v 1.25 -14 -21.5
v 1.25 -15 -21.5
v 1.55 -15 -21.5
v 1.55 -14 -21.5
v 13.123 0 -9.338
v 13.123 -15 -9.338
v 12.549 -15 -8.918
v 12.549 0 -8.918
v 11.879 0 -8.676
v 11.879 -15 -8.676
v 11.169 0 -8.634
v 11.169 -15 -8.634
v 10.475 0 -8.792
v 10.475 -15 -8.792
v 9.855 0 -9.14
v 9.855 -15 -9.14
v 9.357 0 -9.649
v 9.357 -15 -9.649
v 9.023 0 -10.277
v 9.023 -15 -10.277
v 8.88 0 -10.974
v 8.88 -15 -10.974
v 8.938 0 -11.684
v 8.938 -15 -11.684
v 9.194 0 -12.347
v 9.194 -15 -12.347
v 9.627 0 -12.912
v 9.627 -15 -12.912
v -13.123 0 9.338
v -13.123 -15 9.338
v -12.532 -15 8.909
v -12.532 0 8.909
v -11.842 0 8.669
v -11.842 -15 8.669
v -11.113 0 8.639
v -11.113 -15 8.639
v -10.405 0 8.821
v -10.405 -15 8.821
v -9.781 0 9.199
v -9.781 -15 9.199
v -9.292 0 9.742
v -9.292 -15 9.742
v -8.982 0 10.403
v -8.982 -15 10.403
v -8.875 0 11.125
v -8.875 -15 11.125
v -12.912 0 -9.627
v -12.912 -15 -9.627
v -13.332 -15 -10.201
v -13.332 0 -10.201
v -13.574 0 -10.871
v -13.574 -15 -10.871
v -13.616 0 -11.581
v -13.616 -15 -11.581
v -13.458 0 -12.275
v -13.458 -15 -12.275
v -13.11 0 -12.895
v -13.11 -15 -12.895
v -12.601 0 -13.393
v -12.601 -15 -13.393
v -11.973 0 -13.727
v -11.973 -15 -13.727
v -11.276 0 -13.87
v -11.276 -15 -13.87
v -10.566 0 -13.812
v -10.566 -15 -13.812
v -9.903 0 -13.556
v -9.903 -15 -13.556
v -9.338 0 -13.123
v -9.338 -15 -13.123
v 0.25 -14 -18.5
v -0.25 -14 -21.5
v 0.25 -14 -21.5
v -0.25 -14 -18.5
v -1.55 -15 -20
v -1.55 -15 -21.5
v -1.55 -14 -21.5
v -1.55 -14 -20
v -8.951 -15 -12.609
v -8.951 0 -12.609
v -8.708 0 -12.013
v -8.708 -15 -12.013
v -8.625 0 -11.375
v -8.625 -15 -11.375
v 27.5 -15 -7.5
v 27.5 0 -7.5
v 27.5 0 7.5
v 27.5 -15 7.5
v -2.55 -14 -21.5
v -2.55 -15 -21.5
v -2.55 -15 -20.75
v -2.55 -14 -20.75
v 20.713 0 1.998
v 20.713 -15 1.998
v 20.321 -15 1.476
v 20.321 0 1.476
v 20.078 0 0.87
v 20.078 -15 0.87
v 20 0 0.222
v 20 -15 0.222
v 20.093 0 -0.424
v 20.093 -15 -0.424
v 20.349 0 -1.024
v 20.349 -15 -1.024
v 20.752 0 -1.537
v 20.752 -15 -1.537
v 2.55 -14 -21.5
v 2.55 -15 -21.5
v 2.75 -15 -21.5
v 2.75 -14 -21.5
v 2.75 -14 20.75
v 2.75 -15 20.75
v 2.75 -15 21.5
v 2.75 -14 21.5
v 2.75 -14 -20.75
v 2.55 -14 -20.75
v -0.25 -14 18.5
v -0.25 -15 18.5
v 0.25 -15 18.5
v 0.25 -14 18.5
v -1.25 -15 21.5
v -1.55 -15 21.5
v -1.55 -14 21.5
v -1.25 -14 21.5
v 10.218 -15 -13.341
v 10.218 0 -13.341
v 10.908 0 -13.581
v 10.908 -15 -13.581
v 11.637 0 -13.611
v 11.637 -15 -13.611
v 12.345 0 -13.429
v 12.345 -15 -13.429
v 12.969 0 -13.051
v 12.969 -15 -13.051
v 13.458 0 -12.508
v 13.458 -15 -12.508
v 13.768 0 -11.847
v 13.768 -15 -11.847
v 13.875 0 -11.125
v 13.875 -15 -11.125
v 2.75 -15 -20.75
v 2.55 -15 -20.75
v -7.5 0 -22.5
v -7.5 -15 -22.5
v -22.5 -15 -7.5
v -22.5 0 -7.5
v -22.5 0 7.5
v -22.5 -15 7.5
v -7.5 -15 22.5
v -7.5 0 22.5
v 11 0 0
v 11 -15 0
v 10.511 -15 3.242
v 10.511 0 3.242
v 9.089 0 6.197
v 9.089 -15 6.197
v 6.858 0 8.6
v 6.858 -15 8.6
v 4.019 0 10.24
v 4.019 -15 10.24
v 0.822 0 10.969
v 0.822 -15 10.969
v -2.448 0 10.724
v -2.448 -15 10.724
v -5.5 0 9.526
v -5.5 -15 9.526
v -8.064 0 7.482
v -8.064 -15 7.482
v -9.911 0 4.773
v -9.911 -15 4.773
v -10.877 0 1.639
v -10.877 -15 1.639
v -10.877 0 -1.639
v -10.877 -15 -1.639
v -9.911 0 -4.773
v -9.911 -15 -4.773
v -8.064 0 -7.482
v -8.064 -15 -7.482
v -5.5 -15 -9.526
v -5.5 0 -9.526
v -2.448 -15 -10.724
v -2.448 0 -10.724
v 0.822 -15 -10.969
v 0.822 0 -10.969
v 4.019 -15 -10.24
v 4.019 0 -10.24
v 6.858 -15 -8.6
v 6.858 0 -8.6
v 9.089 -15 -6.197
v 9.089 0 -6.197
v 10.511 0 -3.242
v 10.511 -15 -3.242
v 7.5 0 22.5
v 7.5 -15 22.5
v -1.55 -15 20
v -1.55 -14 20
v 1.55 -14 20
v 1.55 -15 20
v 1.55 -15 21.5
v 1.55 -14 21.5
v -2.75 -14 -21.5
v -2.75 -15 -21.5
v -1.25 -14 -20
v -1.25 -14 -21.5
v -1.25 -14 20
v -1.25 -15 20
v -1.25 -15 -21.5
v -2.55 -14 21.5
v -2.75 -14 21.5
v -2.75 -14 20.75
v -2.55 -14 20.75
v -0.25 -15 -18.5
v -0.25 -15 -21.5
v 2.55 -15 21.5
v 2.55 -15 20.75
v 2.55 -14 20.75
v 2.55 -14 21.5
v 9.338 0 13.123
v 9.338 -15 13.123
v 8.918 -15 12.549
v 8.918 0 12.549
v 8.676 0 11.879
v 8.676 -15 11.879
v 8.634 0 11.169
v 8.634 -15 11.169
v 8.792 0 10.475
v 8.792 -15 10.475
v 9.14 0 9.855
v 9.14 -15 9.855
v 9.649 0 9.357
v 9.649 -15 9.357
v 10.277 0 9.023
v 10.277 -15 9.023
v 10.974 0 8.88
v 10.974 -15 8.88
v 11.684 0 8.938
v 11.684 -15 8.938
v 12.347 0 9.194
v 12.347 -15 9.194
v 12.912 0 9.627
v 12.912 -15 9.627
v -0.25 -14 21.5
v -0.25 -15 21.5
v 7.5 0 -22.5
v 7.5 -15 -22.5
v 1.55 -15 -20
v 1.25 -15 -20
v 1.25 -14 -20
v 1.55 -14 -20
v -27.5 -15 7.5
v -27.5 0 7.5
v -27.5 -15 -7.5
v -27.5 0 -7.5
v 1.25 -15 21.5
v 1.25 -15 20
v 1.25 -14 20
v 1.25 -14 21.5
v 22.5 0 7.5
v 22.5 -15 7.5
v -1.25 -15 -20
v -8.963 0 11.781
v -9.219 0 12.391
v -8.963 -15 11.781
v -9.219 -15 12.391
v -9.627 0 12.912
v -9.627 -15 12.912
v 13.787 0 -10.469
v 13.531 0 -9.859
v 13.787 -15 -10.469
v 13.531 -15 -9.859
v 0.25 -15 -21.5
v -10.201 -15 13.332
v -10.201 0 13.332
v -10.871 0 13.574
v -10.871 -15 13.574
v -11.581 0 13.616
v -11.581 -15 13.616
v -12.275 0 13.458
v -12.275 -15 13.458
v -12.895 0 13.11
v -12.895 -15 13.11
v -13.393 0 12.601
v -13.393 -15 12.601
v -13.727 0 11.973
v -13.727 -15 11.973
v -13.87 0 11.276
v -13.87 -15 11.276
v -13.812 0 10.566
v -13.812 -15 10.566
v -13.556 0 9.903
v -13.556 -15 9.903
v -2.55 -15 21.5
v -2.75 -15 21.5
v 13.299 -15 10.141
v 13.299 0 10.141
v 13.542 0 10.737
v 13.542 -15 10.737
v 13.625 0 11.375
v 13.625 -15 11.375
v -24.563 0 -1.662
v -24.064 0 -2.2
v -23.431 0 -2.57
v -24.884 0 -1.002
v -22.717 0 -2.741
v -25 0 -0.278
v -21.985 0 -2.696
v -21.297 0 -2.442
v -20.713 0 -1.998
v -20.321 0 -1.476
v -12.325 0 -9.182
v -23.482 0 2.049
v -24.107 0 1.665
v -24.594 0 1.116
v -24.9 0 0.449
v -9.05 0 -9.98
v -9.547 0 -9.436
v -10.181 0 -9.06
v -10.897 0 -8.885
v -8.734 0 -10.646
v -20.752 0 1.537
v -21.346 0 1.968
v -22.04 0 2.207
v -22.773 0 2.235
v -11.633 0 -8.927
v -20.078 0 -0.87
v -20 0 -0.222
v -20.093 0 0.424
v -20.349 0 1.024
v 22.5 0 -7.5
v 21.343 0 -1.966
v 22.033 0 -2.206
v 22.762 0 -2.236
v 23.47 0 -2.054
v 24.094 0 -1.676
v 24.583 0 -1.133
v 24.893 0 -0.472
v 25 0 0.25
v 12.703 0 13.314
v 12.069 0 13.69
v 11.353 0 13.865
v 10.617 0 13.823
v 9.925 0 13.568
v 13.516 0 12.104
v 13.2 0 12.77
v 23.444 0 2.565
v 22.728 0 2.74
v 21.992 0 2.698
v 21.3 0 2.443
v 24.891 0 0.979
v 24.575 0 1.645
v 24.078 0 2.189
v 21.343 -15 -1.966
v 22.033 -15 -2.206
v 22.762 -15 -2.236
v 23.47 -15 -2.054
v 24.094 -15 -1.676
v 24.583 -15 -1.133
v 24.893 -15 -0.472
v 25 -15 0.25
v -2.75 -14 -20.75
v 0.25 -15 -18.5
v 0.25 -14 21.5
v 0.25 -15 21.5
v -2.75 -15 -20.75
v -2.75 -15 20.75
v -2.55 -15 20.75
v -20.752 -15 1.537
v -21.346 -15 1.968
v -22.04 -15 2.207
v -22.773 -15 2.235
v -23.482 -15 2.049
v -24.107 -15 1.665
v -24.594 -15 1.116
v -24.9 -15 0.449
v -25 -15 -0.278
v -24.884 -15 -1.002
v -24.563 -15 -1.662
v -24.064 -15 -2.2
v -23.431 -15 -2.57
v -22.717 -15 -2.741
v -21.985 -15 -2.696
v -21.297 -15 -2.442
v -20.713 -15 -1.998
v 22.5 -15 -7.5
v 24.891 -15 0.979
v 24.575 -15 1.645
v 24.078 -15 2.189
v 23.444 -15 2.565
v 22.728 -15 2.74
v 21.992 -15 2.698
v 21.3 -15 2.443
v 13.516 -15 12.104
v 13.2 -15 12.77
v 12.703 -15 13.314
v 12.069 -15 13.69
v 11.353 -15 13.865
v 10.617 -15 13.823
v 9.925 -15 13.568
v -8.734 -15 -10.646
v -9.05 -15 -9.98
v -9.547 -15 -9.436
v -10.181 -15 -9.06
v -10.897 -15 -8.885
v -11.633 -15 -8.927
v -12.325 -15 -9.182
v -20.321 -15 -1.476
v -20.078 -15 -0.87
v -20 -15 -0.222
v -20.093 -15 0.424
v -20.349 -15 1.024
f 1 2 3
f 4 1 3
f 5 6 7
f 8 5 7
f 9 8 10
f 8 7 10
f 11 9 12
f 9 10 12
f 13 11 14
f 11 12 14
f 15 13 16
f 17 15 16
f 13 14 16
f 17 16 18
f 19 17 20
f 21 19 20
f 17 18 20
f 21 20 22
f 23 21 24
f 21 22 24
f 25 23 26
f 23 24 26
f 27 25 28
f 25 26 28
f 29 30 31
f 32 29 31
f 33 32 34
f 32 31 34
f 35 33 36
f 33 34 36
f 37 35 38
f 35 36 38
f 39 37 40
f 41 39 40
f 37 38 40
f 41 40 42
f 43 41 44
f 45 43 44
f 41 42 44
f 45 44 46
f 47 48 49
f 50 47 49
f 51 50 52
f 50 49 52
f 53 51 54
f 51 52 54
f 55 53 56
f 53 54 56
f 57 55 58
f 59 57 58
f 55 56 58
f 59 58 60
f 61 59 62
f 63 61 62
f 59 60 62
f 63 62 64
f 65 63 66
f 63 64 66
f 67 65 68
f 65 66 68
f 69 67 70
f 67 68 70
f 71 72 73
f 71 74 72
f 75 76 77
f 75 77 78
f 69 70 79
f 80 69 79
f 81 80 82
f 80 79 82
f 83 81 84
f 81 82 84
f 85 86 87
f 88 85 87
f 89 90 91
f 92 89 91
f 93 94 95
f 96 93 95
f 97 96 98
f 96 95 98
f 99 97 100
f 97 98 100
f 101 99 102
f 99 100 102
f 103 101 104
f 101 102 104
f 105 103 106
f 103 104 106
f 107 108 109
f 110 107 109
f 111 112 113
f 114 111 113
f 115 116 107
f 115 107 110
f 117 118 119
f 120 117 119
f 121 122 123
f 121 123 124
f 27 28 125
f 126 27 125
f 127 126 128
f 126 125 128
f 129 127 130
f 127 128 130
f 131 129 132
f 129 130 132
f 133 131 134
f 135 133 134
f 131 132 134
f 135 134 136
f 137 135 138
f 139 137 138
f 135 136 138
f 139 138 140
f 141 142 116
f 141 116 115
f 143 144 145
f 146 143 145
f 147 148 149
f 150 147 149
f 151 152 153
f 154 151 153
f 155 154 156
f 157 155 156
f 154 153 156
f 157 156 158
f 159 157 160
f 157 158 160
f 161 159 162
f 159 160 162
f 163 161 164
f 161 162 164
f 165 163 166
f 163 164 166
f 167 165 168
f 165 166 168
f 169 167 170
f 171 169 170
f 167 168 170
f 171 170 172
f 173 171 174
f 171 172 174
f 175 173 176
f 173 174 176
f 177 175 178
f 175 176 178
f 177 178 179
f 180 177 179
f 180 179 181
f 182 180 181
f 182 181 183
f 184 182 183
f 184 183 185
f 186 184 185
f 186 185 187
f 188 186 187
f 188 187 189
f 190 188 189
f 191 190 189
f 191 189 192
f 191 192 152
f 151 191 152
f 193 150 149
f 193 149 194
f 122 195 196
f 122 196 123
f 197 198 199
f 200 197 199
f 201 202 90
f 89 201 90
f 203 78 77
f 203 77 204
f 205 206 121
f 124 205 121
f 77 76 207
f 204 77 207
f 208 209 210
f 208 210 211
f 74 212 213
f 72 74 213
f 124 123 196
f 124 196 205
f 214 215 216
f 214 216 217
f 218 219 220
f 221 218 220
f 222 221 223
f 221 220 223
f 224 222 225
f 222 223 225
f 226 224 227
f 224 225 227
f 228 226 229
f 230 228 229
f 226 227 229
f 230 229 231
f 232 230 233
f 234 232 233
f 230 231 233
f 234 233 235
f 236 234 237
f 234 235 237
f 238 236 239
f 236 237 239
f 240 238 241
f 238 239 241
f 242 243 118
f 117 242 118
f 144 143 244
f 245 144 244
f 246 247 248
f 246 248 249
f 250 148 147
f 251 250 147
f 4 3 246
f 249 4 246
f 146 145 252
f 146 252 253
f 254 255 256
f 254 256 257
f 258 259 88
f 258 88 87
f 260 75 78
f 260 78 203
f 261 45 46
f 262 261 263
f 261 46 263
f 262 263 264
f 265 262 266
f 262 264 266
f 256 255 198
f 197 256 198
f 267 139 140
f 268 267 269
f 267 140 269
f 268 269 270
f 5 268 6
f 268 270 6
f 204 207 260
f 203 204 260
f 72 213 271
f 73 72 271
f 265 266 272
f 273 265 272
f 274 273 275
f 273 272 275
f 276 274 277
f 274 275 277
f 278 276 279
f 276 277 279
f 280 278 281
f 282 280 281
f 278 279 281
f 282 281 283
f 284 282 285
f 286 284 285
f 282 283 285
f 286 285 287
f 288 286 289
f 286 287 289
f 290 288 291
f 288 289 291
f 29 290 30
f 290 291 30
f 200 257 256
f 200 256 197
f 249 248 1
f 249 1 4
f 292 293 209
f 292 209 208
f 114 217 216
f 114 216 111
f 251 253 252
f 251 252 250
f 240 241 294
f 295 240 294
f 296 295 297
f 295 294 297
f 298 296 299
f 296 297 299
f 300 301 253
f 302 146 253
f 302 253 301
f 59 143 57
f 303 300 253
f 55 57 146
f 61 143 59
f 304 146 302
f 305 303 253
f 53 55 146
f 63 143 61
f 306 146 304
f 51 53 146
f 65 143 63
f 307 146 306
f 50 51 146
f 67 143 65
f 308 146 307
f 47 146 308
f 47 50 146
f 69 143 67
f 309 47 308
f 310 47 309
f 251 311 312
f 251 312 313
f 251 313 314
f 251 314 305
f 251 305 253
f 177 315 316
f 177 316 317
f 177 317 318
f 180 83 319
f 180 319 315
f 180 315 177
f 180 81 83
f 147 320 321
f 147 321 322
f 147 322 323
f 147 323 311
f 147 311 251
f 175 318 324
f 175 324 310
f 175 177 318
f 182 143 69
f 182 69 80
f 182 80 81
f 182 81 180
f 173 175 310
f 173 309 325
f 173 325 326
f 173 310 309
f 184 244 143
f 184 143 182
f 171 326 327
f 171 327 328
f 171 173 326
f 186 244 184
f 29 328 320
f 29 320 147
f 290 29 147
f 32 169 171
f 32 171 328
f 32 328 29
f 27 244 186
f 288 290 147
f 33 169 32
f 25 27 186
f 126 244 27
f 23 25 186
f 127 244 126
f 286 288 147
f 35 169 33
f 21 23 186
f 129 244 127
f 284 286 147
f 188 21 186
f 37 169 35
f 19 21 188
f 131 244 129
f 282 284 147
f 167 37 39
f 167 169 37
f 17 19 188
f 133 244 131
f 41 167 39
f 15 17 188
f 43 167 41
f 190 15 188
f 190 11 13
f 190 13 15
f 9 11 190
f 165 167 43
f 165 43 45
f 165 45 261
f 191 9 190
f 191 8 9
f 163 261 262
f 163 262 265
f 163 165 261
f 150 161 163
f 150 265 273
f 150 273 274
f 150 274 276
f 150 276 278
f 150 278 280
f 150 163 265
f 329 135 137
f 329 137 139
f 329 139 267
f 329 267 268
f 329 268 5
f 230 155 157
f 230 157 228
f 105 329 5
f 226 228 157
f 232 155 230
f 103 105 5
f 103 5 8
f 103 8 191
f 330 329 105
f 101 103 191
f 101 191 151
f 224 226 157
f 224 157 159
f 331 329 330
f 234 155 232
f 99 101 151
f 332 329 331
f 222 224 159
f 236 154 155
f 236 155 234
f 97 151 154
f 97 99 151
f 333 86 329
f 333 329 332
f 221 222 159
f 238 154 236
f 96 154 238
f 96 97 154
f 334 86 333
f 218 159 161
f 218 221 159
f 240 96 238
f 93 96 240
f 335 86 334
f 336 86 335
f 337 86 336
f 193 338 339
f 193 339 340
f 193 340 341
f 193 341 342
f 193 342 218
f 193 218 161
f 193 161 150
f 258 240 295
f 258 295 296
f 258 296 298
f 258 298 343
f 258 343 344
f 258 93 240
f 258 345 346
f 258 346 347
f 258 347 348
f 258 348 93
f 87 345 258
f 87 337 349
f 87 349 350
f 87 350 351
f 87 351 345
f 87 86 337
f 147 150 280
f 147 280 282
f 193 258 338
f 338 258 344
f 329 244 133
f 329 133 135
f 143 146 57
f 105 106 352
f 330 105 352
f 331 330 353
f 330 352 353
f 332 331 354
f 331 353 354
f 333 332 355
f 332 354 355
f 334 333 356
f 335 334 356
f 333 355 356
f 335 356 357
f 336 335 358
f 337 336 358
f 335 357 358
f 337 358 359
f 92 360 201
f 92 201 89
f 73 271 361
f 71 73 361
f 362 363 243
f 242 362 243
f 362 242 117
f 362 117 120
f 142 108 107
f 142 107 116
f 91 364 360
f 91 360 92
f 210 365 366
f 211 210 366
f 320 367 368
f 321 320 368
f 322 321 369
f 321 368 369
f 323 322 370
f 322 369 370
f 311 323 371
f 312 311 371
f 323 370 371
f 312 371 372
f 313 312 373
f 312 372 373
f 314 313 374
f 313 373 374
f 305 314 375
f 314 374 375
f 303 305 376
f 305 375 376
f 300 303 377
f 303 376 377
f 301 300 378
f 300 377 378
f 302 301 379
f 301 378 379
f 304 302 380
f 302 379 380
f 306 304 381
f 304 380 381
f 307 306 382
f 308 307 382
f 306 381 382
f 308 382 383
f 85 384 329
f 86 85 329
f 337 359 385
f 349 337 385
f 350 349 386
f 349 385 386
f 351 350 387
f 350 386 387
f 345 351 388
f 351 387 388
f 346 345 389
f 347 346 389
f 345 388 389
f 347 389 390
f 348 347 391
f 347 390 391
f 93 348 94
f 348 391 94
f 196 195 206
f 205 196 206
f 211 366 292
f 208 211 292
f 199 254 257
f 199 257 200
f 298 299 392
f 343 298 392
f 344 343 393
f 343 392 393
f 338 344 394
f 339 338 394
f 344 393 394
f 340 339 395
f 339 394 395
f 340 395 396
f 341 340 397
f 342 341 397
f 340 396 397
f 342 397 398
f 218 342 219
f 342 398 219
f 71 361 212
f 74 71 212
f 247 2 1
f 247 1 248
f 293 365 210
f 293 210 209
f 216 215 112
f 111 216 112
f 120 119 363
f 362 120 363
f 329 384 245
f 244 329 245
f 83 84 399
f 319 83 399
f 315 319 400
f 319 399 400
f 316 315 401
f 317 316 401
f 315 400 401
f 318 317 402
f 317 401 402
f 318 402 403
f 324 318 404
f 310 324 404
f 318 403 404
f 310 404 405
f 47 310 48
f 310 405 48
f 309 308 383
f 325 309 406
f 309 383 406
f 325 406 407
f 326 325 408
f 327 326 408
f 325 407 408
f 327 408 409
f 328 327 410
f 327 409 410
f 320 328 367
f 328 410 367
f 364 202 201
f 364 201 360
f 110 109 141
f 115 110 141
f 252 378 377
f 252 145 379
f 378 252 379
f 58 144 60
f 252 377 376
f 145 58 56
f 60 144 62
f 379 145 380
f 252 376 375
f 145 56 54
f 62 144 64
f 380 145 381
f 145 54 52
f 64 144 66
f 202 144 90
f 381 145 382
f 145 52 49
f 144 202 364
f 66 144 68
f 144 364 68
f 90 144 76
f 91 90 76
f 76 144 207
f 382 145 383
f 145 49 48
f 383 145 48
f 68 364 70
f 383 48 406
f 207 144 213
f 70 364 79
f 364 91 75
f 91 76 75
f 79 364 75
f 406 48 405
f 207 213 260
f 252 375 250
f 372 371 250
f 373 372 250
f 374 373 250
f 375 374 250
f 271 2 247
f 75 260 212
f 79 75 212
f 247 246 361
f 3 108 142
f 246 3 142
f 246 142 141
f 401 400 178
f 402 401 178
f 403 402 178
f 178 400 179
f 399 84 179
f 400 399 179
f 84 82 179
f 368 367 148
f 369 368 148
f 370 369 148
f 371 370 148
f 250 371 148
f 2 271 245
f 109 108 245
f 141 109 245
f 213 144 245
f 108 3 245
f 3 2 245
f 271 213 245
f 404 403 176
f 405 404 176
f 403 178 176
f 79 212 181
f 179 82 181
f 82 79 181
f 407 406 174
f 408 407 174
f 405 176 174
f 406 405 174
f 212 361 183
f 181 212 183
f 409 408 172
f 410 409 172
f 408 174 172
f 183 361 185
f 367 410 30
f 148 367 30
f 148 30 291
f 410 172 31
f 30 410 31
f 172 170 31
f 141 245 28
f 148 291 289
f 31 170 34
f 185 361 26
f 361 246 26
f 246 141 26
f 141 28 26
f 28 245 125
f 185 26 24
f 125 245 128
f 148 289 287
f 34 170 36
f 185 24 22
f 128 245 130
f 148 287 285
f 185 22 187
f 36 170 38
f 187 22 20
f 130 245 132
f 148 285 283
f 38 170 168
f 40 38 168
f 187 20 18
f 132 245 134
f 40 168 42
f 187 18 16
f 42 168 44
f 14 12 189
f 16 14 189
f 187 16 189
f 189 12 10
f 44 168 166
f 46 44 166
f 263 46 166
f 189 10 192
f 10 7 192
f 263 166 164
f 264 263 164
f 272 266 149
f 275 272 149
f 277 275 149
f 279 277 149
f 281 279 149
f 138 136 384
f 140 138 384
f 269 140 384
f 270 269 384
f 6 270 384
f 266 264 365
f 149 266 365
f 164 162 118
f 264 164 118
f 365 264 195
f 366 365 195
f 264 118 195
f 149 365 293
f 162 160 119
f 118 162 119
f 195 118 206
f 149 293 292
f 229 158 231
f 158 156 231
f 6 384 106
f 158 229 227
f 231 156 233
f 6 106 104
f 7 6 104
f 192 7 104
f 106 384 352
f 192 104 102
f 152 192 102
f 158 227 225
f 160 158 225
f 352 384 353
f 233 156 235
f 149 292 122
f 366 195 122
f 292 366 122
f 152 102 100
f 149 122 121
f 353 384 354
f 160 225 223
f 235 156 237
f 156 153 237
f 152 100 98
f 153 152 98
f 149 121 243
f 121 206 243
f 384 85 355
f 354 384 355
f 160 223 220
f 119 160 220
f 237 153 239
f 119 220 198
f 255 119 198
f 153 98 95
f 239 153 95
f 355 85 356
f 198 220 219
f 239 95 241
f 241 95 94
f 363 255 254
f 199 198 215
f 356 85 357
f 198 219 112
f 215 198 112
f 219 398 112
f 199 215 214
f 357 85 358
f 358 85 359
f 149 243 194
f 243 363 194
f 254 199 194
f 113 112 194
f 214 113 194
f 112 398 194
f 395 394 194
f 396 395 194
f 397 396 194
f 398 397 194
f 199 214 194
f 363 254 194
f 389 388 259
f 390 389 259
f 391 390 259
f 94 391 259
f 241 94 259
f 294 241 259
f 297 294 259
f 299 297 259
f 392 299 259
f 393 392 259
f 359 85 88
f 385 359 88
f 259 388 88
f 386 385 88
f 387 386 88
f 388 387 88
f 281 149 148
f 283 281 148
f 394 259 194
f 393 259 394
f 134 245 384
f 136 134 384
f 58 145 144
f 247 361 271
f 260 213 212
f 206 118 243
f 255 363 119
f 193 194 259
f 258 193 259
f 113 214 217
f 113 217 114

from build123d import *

# Parameters (mm, degrees)
F0_W      = 45
F0_H      = 45
F1_DEPTH  = 15
F2_R      = 11
F3_DEPTH  = 15.001
F5_DEPTH  = 15.001
F6_W      = 0.3
F6_H      = 1.5
F6_W_2    = 0.2
F6_H_2    = 0.75
F7_DEPTH  = 1
F8_DEPTH  = 5
F9_DEPTH  = 5
F11_DEPTH = 15.001


with BuildPart() as f1:
    # F0 (on Front) → F1 (new body)
    with BuildSketch(Plane.XZ):
        Rectangle(F0_W, F0_H)
    extrude(amount=F1_DEPTH)

    # F2 (on face) → F3 (cut, through all)
    with BuildSketch(Plane.XZ.offset(15)):
        Circle(F2_R)
    extrude(amount=-F3_DEPTH, mode=Mode.SUBTRACT)

    # F4 (on face) → F5 (cut, through all)
    with BuildSketch(Plane.XZ.offset(15)):
        Polygon((-22.5, 22.5), (-22.5, 7.5), (-7.5, 22.5), align=None)
        Polygon((22.5, 22.5), (7.5, 22.5), (22.5, 7.5), align=None)
        Polygon((-22.5, -22.5), (-7.5, -22.5), (-22.5, -7.5), align=None)
        Polygon((22.5, -22.5), (22.5, -7.5), (7.5, -22.5), align=None)
    extrude(amount=-F5_DEPTH, mode=Mode.SUBTRACT)

    # F6 (on face) → F7 (cut)
    with BuildSketch(Plane.XZ.offset(15)):
        Polygon((0.25, 20), (0.25, 21.5), (-0.25, 21.5), (-0.25, 20), (-0.25, 18.5), (0.25, 18.5), align=None)
        with Locations((-1.4, 20.75)):
            Rectangle(F6_W, F6_H)
        with Locations((1.4, 20.75)):
            Rectangle(F6_W, F6_H)
        with Locations((-2.65, 21.125)):
            Rectangle(F6_W_2, F6_H_2)
        with Locations((2.65, 21.125)):
            Rectangle(F6_W_2, F6_H_2)
        Polygon((-0.25, -21.5), (0.25, -21.5), (0.25, -20), (0.25, -18.5), (-0.25, -18.5), (-0.25, -20), align=None)
        with Locations((-1.4, -20.75)):
            Rectangle(F6_W, F6_H)
        with Locations((2.65, -21.125)):
            Rectangle(F6_W_2, F6_H_2)
        with Locations((1.4, -20.75)):
            Rectangle(F6_W, F6_H)
        with Locations((-2.65, -21.125)):
            Rectangle(F6_W_2, F6_H_2)
    extrude(amount=-F7_DEPTH, mode=Mode.SUBTRACT)

    # F8 (add): a face of the model
    f8_faces = [f1.faces().sort_by_distance(p)[0] for p in [
        (22.5, -7.5, 0),
    ]]
    extrude(f8_faces, amount=F8_DEPTH)

    # F9 (add): a face of the model
    f9_faces = [f1.faces().sort_by_distance(p)[0] for p in [
        (-22.5, -7.5, 0),
    ]]
    extrude(f9_faces, amount=F9_DEPTH)

    # F10 (on face) → F11 (cut, through all)
    with BuildSketch(Plane.XZ.offset(15)):
        with BuildLine():
            ThreePointArc((13.625, 11.375), (12.068862752, 13.6899779924), (9.3377015157, 13.123017199))
            Line((9.3377015157, 13.123017199), (12.9122984843, 9.626982801))
            ThreePointArc((12.9122984843, 9.626982801), (13.4399779924, 10.431137248), (13.625, 11.375))
        make_face()
        with BuildLine():
            Line((12.9122984843, 9.626982801), (9.3377015157, 13.123017199))
            ThreePointArc((9.3377015157, 13.123017199), (9.376982801, 9.5877015157), (12.9122984843, 9.626982801))
        make_face()
        with BuildLine():
            Line((20.7127015157, 1.998017199), (22.5, 0.25))
            Line((22.5, 0.25), (20.751982801, -1.5372984843))
            ThreePointArc((20.751982801, -1.5372984843), (23.4695248843, -2.0543483892), (25, 0.25))
            ThreePointArc((25, 0.25), (23.443862752, 2.5649779924), (20.7127015157, 1.998017199))
        make_face()
        with BuildLine():
            Line((20.751982801, -1.5372984843), (22.5, 0.25))
            Line((22.5, 0.25), (20.7127015157, 1.998017199))
            ThreePointArc((20.7127015157, 1.998017199), (20.0001543067, 0.2222239367), (20.751982801, -1.5372984843))
        make_face()
        with BuildLine():
            ThreePointArc((-12.9122984843, -9.626982801), (-12.873017199, -13.1622984843), (-9.3377015157, -13.123017199))
            Line((-9.3377015157, -13.123017199), (-12.9122984843, -9.626982801))
        make_face()
        with BuildLine():
            Line((-12.9122984843, -9.626982801), (-9.3377015157, -13.123017199))
            ThreePointArc((-9.3377015157, -13.123017199), (-8.8100220076, -12.318862752), (-8.625, -11.375))
            ThreePointArc((-8.625, -11.375), (-10.181137248, -9.0600220076), (-12.9122984843, -9.626982801))
        make_face()
        with BuildLine():
            Line((-20.7127015157, -1.998017199), (-22.5, -0.25))
            Line((-22.5, -0.25), (-20.751982801, 1.5372984843))
            ThreePointArc((-20.751982801, 1.5372984843), (-24.9998456933, -0.2777760633), (-20.7127015157, -1.998017199))
        make_face()
        with BuildLine():
            Line((-20.751982801, 1.5372984843), (-22.5, -0.25))
            Line((-22.5, -0.25), (-20.7127015157, -1.998017199))
            ThreePointArc((-20.7127015157, -1.998017199), (-20.1850220076, -1.193862752), (-20, -0.25))
            ThreePointArc((-20, -0.25), (-20.1956516108, 0.7195248843), (-20.751982801, 1.5372984843))
        make_face()
        with BuildLine():
            ThreePointArc((-13.123017199, 9.3377015157), (-10.4054751157, 8.8206516108), (-8.875, 11.125))
            ThreePointArc((-8.875, 11.125), (-9.0706516108, 12.0945248843), (-9.626982801, 12.9122984843))
            Line((-9.626982801, 12.9122984843), (-13.123017199, 9.3377015157))
        make_face()
        with BuildLine():
            Line((-13.123017199, 9.3377015157), (-9.626982801, 12.9122984843))
            ThreePointArc((-9.626982801, 12.9122984843), (-13.1622984843, 12.873017199), (-13.123017199, 9.3377015157))
        make_face()
        with BuildLine():
            ThreePointArc((9.626982801, -12.9122984843), (12.3445248843, -13.4293483892), (13.875, -11.125))
            ThreePointArc((13.875, -11.125), (13.6793483892, -10.1554751157), (13.123017199, -9.3377015157))
            Line((13.123017199, -9.3377015157), (9.626982801, -12.9122984843))
        make_face()
        with BuildLine():
            Line((9.626982801, -12.9122984843), (13.123017199, -9.3377015157))
            ThreePointArc((13.123017199, -9.3377015157), (9.5877015157, -9.376982801), (9.626982801, -12.9122984843))
        make_face()
    extrude(amount=-F11_DEPTH, mode=Mode.SUBTRACT)


solid = f1.part
